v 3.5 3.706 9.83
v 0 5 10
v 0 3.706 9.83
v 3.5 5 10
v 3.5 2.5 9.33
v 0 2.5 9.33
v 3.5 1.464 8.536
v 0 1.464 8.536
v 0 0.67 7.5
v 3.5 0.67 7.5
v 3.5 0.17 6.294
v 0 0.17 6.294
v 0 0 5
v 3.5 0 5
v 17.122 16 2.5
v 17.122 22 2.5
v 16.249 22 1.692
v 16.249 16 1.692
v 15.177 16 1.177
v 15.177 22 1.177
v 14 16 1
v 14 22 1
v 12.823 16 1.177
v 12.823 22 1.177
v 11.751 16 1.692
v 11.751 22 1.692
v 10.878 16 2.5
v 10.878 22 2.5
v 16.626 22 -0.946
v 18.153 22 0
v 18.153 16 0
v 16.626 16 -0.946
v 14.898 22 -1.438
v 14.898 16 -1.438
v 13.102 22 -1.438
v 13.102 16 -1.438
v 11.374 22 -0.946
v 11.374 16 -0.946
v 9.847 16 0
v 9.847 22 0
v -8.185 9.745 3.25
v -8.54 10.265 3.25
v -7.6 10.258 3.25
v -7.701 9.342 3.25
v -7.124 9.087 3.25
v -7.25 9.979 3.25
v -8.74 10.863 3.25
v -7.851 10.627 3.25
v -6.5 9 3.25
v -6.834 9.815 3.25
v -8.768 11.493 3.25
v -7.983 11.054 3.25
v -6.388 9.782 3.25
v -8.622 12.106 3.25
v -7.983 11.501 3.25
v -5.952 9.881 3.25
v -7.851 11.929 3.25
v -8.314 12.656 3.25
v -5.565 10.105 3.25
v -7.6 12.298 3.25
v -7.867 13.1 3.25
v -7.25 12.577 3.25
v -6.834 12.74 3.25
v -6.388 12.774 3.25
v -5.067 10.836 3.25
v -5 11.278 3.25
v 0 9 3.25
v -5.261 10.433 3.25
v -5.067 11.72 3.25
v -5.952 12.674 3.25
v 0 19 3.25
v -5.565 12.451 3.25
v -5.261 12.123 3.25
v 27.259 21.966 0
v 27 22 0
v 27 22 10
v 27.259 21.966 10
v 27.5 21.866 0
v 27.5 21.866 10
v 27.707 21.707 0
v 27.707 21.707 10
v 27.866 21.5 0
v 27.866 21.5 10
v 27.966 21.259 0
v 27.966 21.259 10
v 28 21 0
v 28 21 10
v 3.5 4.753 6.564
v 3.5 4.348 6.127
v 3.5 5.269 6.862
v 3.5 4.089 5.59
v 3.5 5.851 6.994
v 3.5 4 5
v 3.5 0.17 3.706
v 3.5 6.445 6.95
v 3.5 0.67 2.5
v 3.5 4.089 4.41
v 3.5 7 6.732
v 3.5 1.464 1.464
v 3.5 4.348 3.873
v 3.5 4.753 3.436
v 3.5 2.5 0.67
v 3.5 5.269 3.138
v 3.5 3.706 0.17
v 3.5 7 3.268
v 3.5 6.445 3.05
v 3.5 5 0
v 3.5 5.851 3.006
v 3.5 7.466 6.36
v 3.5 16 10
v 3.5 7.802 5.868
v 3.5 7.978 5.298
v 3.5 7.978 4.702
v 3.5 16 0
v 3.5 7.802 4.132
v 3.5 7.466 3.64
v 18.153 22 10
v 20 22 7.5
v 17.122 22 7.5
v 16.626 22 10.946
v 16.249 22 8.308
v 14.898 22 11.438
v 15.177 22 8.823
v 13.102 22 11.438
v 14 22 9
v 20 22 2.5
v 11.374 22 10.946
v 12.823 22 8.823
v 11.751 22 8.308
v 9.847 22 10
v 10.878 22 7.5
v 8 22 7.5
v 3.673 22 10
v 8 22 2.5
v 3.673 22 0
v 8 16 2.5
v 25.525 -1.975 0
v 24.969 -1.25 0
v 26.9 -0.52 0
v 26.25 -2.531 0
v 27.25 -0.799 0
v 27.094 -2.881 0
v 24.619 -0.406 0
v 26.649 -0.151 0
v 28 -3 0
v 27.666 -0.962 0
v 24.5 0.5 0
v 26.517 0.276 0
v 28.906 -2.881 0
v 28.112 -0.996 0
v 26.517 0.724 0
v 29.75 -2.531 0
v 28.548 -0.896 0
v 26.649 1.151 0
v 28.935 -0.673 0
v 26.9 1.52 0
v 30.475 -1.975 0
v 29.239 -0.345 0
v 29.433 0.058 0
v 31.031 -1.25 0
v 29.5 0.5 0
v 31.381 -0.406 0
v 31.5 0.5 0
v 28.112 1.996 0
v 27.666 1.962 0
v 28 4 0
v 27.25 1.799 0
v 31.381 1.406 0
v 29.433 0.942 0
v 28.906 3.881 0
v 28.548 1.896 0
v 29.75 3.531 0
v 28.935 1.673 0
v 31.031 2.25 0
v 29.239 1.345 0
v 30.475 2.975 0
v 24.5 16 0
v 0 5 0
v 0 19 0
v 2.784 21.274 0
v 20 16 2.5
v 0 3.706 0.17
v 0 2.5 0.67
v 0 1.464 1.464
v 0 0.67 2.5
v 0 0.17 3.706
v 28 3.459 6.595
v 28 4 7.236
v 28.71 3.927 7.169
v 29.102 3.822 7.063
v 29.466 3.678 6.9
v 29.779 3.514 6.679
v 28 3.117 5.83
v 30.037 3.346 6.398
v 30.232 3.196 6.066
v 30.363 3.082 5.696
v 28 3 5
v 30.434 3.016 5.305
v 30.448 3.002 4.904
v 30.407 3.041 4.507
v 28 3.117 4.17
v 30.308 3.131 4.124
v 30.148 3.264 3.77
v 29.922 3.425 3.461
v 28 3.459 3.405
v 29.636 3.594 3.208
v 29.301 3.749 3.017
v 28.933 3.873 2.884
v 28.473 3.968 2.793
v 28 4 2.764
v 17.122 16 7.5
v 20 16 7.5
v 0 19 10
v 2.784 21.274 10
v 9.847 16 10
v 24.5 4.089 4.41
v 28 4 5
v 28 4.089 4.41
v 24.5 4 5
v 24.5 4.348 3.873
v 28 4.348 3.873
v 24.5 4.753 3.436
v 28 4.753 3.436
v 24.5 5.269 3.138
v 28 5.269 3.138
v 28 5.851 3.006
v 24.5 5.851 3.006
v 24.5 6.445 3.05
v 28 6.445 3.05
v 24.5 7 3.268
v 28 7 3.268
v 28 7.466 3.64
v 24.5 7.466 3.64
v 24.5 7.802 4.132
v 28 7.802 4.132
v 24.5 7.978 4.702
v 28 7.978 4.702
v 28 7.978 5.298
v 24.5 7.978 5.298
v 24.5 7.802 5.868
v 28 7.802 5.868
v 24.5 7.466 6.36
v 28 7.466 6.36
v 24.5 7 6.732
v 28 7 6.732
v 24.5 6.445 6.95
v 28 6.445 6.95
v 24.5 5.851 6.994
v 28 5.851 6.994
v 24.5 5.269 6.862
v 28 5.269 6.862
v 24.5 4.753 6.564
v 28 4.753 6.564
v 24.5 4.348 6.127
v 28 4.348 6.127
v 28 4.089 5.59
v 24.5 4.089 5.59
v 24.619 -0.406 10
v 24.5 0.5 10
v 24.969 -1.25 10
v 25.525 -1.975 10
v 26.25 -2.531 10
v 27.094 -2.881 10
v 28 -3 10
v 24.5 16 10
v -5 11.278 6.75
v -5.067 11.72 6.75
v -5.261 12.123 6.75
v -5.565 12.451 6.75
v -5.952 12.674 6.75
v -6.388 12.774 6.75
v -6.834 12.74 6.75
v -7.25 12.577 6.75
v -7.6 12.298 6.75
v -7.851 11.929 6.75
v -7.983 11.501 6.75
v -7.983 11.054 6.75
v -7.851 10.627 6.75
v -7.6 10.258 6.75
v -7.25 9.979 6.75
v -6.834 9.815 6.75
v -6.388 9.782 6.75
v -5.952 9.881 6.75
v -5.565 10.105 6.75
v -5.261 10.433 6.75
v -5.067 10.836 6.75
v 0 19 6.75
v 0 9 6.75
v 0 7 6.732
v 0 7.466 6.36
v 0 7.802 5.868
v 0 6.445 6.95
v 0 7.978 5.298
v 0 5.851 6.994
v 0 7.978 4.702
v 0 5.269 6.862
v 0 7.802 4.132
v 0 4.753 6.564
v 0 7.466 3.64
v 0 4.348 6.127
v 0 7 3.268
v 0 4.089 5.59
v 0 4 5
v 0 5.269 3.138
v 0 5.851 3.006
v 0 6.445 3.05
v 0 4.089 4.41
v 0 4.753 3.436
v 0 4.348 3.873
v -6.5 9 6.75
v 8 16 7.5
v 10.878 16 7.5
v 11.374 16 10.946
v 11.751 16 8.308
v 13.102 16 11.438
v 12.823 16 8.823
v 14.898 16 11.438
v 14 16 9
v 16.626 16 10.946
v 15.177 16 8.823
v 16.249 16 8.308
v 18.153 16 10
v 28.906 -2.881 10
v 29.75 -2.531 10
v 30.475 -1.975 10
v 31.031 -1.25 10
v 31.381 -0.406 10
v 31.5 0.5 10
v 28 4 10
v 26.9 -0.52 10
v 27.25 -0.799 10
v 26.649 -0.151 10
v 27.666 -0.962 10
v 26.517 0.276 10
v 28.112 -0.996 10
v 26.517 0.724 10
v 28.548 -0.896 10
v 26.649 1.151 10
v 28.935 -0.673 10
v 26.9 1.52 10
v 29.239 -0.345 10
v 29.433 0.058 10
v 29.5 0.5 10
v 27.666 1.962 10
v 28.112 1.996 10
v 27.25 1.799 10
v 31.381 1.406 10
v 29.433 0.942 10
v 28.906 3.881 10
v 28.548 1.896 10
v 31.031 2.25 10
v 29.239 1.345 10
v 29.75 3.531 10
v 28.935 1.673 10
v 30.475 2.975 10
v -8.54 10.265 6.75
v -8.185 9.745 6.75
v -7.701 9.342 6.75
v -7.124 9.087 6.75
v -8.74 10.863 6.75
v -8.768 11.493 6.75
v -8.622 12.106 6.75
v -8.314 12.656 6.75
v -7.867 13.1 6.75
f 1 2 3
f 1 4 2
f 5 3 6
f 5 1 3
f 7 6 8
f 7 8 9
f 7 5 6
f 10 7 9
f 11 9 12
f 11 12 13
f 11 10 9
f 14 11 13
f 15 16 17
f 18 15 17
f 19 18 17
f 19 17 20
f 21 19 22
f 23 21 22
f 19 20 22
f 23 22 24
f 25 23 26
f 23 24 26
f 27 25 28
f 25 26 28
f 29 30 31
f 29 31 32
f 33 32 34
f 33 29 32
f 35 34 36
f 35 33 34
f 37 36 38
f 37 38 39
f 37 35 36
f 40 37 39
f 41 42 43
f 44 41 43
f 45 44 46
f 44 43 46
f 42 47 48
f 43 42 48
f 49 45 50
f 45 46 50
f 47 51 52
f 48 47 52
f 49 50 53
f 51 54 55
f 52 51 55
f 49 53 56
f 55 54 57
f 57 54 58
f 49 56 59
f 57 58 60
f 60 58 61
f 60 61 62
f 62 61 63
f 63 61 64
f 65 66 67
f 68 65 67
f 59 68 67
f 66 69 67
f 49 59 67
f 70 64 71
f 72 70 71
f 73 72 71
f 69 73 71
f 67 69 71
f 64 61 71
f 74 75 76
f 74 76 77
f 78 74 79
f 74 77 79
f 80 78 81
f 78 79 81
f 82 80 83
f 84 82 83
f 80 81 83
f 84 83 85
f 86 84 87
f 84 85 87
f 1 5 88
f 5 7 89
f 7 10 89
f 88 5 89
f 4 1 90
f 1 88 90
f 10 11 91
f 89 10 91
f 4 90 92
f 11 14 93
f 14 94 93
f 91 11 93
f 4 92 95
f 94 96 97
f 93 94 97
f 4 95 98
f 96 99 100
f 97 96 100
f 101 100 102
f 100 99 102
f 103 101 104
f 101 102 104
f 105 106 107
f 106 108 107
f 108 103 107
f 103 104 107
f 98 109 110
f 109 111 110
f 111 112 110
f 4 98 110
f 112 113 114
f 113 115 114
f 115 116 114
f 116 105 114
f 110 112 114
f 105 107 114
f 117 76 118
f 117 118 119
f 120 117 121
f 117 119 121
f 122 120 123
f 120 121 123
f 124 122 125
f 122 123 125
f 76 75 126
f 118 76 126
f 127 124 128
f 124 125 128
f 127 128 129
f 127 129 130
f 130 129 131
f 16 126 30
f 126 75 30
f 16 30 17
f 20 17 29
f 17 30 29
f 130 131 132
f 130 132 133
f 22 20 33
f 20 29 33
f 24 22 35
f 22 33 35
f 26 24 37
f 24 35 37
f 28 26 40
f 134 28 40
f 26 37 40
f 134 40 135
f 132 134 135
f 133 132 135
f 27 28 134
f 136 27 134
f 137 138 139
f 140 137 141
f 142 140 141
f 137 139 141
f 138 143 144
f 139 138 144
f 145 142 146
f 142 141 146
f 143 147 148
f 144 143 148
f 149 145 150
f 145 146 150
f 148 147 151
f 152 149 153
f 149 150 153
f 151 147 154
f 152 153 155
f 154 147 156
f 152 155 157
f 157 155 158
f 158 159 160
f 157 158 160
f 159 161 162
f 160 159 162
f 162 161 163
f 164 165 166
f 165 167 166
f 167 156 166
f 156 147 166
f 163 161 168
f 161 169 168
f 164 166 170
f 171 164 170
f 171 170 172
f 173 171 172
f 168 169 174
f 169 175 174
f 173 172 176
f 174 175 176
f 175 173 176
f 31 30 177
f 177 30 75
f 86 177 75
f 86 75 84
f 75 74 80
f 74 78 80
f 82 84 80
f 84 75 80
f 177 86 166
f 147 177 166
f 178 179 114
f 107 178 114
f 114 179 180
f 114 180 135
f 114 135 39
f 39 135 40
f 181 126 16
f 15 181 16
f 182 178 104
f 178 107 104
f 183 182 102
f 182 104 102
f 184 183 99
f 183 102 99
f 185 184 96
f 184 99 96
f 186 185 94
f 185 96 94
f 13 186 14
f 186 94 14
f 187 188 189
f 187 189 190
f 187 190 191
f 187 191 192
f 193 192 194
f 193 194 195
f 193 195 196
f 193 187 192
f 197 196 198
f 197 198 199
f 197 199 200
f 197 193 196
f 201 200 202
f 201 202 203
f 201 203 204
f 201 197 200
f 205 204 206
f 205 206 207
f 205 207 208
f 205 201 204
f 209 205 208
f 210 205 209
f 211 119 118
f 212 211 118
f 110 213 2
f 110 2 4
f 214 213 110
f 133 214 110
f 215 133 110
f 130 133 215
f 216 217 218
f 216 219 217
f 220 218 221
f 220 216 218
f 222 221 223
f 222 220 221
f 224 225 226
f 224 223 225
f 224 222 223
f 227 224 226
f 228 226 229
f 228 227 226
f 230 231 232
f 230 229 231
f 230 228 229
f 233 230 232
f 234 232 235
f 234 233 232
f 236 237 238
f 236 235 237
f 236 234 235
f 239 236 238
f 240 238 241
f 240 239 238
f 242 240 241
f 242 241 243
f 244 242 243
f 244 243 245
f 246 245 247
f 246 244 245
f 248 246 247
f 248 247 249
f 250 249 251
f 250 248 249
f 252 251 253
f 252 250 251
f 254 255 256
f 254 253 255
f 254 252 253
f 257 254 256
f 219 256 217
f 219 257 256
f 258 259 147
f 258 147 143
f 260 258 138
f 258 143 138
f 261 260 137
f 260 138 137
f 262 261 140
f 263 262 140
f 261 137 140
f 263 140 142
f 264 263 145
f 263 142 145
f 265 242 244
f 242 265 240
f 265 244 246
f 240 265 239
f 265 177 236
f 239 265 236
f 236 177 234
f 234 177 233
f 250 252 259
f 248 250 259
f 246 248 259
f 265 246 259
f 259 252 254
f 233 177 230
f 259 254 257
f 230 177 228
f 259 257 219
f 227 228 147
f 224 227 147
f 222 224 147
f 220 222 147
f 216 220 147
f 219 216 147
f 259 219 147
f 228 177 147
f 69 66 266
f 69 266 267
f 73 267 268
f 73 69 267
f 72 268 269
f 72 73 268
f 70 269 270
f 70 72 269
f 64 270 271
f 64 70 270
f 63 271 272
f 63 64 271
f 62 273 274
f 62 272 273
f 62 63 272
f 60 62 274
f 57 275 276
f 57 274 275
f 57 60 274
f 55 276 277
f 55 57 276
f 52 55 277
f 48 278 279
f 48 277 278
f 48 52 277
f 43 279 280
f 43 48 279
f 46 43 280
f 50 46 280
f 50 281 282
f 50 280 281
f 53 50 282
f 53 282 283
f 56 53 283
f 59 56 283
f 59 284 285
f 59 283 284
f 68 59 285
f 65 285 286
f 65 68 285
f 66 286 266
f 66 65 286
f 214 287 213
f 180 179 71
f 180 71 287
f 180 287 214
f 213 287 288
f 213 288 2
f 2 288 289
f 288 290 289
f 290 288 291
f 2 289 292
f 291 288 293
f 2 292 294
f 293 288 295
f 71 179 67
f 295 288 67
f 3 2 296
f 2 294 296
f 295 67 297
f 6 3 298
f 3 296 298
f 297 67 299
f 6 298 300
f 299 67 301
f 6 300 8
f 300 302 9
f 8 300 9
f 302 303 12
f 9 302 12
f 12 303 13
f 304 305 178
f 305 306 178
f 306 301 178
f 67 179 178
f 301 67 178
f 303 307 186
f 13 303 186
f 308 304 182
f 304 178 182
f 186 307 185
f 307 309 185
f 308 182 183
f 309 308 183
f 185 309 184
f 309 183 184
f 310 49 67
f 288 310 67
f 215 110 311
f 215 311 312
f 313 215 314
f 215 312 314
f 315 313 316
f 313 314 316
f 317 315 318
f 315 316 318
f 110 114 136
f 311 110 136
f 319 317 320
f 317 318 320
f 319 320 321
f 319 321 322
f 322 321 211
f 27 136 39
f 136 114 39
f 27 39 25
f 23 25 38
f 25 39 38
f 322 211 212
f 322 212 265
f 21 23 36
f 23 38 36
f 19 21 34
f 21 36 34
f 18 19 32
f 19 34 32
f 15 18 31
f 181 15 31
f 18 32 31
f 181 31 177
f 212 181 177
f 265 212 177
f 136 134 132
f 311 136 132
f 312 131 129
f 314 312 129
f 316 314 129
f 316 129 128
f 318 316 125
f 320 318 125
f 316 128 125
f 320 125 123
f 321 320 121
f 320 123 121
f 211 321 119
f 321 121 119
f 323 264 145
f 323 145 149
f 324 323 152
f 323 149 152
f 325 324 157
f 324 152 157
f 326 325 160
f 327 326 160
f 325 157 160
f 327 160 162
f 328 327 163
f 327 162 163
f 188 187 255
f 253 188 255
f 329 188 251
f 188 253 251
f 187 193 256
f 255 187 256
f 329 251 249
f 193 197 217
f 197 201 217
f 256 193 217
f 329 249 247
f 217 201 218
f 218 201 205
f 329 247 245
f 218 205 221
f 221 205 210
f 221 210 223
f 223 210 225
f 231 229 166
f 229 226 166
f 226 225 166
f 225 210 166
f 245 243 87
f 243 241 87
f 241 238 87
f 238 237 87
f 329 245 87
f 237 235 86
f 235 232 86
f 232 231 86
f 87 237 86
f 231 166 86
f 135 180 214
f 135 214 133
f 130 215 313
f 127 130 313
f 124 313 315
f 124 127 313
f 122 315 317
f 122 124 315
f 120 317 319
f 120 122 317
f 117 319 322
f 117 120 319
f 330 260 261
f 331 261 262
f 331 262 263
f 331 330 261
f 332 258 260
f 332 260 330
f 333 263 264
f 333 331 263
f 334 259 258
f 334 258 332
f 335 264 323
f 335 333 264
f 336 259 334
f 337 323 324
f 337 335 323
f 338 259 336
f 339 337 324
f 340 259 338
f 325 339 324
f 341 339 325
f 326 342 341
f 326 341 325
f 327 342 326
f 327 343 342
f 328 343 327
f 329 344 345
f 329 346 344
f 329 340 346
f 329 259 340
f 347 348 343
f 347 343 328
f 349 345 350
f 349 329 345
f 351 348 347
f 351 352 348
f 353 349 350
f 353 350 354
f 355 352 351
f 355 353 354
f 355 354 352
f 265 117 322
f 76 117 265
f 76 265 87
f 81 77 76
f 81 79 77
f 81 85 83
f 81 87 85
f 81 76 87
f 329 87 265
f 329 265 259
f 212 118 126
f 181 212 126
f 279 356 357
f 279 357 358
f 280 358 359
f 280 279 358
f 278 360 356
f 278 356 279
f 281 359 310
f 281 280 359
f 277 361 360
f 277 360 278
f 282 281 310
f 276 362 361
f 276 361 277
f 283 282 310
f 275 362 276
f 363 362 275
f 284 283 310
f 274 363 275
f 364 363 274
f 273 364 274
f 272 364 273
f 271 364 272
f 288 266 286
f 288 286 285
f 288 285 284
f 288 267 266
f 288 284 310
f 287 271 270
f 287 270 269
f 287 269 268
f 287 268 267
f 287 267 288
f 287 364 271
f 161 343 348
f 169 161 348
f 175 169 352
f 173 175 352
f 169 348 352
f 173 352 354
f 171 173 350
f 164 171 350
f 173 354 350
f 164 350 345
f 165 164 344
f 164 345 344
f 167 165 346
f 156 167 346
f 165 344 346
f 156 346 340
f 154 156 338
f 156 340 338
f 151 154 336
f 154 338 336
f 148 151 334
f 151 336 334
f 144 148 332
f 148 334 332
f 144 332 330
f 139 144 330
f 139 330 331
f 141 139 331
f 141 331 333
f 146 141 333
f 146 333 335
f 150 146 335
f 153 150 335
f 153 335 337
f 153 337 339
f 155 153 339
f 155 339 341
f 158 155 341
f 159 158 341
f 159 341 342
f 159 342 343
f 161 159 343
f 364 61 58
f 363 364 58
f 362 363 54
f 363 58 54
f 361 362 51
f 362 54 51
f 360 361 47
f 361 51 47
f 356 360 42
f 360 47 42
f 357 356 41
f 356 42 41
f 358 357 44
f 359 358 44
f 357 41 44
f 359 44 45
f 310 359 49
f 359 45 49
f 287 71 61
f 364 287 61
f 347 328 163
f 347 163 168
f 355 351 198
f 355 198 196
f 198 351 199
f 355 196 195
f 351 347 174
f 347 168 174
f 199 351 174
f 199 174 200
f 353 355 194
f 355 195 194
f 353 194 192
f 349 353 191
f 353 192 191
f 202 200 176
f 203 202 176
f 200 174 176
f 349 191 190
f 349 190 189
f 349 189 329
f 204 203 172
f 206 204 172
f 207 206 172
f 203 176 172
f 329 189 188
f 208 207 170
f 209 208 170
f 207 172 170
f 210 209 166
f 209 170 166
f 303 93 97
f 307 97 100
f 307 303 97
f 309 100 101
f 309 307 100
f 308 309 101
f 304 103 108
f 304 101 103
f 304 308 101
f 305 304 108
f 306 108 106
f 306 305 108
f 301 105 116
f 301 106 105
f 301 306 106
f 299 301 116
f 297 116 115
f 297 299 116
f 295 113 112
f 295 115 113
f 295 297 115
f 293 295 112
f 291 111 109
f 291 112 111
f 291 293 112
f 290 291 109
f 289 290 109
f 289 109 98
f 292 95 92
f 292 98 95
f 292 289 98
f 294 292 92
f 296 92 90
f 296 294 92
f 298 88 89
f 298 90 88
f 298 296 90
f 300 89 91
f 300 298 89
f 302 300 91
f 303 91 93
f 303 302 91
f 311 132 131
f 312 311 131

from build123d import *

# Parameters (mm, degrees)
SKETCH1_W                = 3.5
SKETCH1_H                = 16
SKETCH1_W_2              = 21
SKETCH1_H_2              = 6
BOSS_EXTRUDE1_DEPTH      = 10
SKETCH2_R                = 6.5
BOSS_EXTRUDE2_DEPTH      = 6
CUT_EXTRUDE2_DEPTH       = 6
SKETCH5_R                = 1.5
CUT_EXTRUDE3_DEPTH       = 41.10610926
BOSS_EXTRUDE3_DEPTH      = 1.75
BOSS_EXTRUDE3_DEPTH_BACK = 1.75
SKETCH6_R                = 2.277777778
CUT_EXTRUDE6_DEPTH       = 39.967935537
CUT_EXTRUDE6_DEPTH_BACK  = 39.967935537
FILLET1_R                = 1
FILLET2_R                = 5
SKETCH11_R               = 2
CUT_EXTRUDE7_DEPTH       = 41.10610926
SKETCH12_R               = 3
CUT_EXTRUDE8_DEPTH       = 45.371780878
CUT_EXTRUDE9_DEPTH       = 39.967935618
CUT_EXTRUDE9_DEPTH_BACK  = 39.967935618
SKETCH13_R               = 1.5


with BuildPart() as part:
    # Sketch1 → Boss-Extrude1 (new body)
    with BuildSketch(Plane.XY):
        with Locations((1.75, 8)):
            Rectangle(SKETCH1_W, SKETCH1_H)
        with Locations((14, 19)):
            Rectangle(SKETCH1_W_2, SKETCH1_H_2)
        with Locations((1.75, 19)):
            Rectangle(SKETCH1_W, SKETCH1_H_2)
        with Locations((26.25, 19)):
            Rectangle(SKETCH1_W, SKETCH1_H_2)
        with BuildLine():
            Line((28, 16), (24.5, 16))
            Line((24.5, 16), (24.5, 0.5))
            ThreePointArc((24.5, 0.5), (25.525126266, 2.974873734), (28, 4))
            Line((28, 4), (28, 16))
        make_face()
        with BuildLine():
            ThreePointArc((28, 4), (25.525126266, 2.974873734), (24.5, 0.5))
            ThreePointArc((24.5, 0.5), (25.525126266, -1.974873734), (28, -3))
            Line((28, -3), (28, 4))
        make_face()
        with BuildLine():
            ThreePointArc((31.5, 0.5), (30.474873734, 2.974873734), (28, 4))
            Line((28, 4), (28, -3))
            ThreePointArc((28, -3), (30.474873734, -1.974873734), (31.5, 0.5))
        make_face()
        with BuildLine():
            ThreePointArc((28, 4), (25.525126266, 2.974873734), (24.5, 0.5))
            ThreePointArc((24.5, 0.5), (25.525126266, -1.974873734), (28, -3))
            Line((28, -3), (28, 4))
        make_face()
        with BuildLine():
            ThreePointArc((31.5, 0.5), (30.474873734, 2.974873734), (28, 4))
            Line((28, 4), (28, -3))
            ThreePointArc((28, -3), (30.474873734, -1.974873734), (31.5, 0.5))
        make_face()
    extrude(amount=BOSS_EXTRUDE1_DEPTH)

    # Sketch2 → Boss-Extrude2 (add)
    with BuildSketch(Plane(origin=(0, 22, 0), x_dir=(1, 0, 0), z_dir=(0, 1, 0))):
        with Locations((14, -5)):
            Circle(SKETCH2_R)
    extrude(amount=-BOSS_EXTRUDE2_DEPTH)

    # Sketch4 → Cut-Extrude2 (cut)
    with BuildSketch(Plane(origin=(0, 22, 0), x_dir=(1, 0, 0), z_dir=(0, 1, 0))):
        with BuildLine():
            Line((17.122498999, -2.5), (10.877501001, -2.5))
            ThreePointArc((10.877501001, -2.5), (10, -5), (10.877501001, -7.5))
            Line((10.877501001, -7.5), (17.122498999, -7.5))
            ThreePointArc((17.122498999, -7.5), (17.774254628, -6.324764885), (18, -5))
            ThreePointArc((18, -5), (17.774254628, -3.675235115), (17.122498999, -2.5))
        make_face()
        with BuildLine():
            Line((20, -2.5), (17.122498999, -2.5))
            ThreePointArc((17.122498999, -2.5), (17.774254628, -3.675235115), (18, -5))
            ThreePointArc((18, -5), (17.774254628, -6.324764885), (17.122498999, -7.5))
            Line((17.122498999, -7.5), (20, -7.5))
            Line((20, -7.5), (20, -2.5))
        make_face()
        with BuildLine():
            Line((10.877501001, -2.5), (8, -2.5))
            Line((8, -2.5), (8, -7.5))
            Line((8, -7.5), (10.877501001, -7.5))
            ThreePointArc((10.877501001, -7.5), (10, -5), (10.877501001, -2.5))
        make_face()
        with BuildLine():
            ThreePointArc((17.122498999, -2.5), (14, -1), (10.877501001, -2.5))
            Line((10.877501001, -2.5), (17.122498999, -2.5))
        make_face()
        with BuildLine():
            Line((17.122498999, -7.5), (10.877501001, -7.5))
            ThreePointArc((10.877501001, -7.5), (14, -9), (17.122498999, -7.5))
        make_face()
    extrude(amount=-CUT_EXTRUDE2_DEPTH, mode=Mode.SUBTRACT)

    # Sketch5 → Cut-Extrude3 (cut, through all)
    with BuildSketch(Plane.XY.offset(10)):
        with Locations((28, 0.5)):
            Circle(SKETCH5_R)
    extrude(amount=-CUT_EXTRUDE3_DEPTH, mode=Mode.SUBTRACT)

    # Sketch6 → Boss-Extrude3 (add, two sides: drawn at the far end of the back side and taken through both)
    with BuildSketch(Plane.XY.offset(5).offset(-BOSS_EXTRUDE3_DEPTH_BACK)):
        with BuildLine():
            Line((0, 9), (0, 19))
            Line((0, 19), (-7.866666667, 13.1))
            ThreePointArc((-7.866666667, 13.1), (-5.48134681, 13.315084157), (-4.222222222, 11.277777778))
            ThreePointArc((-4.222222222, 11.277777778), (-4.889367887, 9.667145665), (-6.5, 9))
            Line((-6.5, 9), (0, 9))
        make_face()
        with Locations((-6.5, 11.277777778)):
            Circle(SKETCH6_R)
    extrude(amount=BOSS_EXTRUDE3_DEPTH + BOSS_EXTRUDE3_DEPTH_BACK)

    # Sketch10 → Cut-Extrude6 (cut, two sides: drawn at the far end of the back side and taken through both)
    with BuildSketch(Plane.XY.offset(5).offset(-CUT_EXTRUDE6_DEPTH_BACK)):
        Polygon((0, 22), (0, 19), (2.784123139, 21.274018631), (3.672955578, 22), align=None)
    extrude(amount=CUT_EXTRUDE6_DEPTH + CUT_EXTRUDE6_DEPTH_BACK, mode=Mode.SUBTRACT)

    # Fillet1
    fillet1_edges = [part.edges().sort_by_distance(p)[0] for p in [
        (28, 22, 5),
    ]]
    fillet(fillet1_edges, radius=FILLET1_R)

    # Fillet2
    fillet2_edges = [part.edges().sort_by_distance(p)[0] for p in [
        (1.75, 0, 0),
        (1.75, 0, 10),
    ]]
    fillet(fillet2_edges, radius=FILLET2_R - 0.0001)  # a hair under: the kernel refuses the full size

    # Sketch11 → Cut-Extrude7 (cut, through all)
    with BuildSketch(Plane(origin=(0, 0, 0), x_dir=(0, 0, -1), z_dir=(1, 0, 0))):
        with Locations(Location((-5, 6, 0), (0, 0, 270))):
            Circle(SKETCH11_R)
    extrude(amount=CUT_EXTRUDE7_DEPTH, mode=Mode.SUBTRACT)

    # Sketch12 → Cut-Extrude8 (cut, through all)
    with BuildSketch(Plane(origin=(28, 0, 0), x_dir=(0, 0, -1), z_dir=(1, 0, 0))):
        with Locations((-5, 6)):
            Circle(SKETCH12_R)
    extrude(amount=CUT_EXTRUDE8_DEPTH, mode=Mode.SUBTRACT)

    # Sketch13 → Cut-Extrude9 (cut, two sides: drawn at the far end of the back side and taken through both)
    with BuildSketch(Plane.XY.offset(5).offset(-CUT_EXTRUDE9_DEPTH_BACK)):
        with Locations((-6.5, 11.277777778)):
            Circle(SKETCH13_R)
    extrude(amount=CUT_EXTRUDE9_DEPTH + CUT_EXTRUDE9_DEPTH_BACK, mode=Mode.SUBTRACT)


solid = part.part
